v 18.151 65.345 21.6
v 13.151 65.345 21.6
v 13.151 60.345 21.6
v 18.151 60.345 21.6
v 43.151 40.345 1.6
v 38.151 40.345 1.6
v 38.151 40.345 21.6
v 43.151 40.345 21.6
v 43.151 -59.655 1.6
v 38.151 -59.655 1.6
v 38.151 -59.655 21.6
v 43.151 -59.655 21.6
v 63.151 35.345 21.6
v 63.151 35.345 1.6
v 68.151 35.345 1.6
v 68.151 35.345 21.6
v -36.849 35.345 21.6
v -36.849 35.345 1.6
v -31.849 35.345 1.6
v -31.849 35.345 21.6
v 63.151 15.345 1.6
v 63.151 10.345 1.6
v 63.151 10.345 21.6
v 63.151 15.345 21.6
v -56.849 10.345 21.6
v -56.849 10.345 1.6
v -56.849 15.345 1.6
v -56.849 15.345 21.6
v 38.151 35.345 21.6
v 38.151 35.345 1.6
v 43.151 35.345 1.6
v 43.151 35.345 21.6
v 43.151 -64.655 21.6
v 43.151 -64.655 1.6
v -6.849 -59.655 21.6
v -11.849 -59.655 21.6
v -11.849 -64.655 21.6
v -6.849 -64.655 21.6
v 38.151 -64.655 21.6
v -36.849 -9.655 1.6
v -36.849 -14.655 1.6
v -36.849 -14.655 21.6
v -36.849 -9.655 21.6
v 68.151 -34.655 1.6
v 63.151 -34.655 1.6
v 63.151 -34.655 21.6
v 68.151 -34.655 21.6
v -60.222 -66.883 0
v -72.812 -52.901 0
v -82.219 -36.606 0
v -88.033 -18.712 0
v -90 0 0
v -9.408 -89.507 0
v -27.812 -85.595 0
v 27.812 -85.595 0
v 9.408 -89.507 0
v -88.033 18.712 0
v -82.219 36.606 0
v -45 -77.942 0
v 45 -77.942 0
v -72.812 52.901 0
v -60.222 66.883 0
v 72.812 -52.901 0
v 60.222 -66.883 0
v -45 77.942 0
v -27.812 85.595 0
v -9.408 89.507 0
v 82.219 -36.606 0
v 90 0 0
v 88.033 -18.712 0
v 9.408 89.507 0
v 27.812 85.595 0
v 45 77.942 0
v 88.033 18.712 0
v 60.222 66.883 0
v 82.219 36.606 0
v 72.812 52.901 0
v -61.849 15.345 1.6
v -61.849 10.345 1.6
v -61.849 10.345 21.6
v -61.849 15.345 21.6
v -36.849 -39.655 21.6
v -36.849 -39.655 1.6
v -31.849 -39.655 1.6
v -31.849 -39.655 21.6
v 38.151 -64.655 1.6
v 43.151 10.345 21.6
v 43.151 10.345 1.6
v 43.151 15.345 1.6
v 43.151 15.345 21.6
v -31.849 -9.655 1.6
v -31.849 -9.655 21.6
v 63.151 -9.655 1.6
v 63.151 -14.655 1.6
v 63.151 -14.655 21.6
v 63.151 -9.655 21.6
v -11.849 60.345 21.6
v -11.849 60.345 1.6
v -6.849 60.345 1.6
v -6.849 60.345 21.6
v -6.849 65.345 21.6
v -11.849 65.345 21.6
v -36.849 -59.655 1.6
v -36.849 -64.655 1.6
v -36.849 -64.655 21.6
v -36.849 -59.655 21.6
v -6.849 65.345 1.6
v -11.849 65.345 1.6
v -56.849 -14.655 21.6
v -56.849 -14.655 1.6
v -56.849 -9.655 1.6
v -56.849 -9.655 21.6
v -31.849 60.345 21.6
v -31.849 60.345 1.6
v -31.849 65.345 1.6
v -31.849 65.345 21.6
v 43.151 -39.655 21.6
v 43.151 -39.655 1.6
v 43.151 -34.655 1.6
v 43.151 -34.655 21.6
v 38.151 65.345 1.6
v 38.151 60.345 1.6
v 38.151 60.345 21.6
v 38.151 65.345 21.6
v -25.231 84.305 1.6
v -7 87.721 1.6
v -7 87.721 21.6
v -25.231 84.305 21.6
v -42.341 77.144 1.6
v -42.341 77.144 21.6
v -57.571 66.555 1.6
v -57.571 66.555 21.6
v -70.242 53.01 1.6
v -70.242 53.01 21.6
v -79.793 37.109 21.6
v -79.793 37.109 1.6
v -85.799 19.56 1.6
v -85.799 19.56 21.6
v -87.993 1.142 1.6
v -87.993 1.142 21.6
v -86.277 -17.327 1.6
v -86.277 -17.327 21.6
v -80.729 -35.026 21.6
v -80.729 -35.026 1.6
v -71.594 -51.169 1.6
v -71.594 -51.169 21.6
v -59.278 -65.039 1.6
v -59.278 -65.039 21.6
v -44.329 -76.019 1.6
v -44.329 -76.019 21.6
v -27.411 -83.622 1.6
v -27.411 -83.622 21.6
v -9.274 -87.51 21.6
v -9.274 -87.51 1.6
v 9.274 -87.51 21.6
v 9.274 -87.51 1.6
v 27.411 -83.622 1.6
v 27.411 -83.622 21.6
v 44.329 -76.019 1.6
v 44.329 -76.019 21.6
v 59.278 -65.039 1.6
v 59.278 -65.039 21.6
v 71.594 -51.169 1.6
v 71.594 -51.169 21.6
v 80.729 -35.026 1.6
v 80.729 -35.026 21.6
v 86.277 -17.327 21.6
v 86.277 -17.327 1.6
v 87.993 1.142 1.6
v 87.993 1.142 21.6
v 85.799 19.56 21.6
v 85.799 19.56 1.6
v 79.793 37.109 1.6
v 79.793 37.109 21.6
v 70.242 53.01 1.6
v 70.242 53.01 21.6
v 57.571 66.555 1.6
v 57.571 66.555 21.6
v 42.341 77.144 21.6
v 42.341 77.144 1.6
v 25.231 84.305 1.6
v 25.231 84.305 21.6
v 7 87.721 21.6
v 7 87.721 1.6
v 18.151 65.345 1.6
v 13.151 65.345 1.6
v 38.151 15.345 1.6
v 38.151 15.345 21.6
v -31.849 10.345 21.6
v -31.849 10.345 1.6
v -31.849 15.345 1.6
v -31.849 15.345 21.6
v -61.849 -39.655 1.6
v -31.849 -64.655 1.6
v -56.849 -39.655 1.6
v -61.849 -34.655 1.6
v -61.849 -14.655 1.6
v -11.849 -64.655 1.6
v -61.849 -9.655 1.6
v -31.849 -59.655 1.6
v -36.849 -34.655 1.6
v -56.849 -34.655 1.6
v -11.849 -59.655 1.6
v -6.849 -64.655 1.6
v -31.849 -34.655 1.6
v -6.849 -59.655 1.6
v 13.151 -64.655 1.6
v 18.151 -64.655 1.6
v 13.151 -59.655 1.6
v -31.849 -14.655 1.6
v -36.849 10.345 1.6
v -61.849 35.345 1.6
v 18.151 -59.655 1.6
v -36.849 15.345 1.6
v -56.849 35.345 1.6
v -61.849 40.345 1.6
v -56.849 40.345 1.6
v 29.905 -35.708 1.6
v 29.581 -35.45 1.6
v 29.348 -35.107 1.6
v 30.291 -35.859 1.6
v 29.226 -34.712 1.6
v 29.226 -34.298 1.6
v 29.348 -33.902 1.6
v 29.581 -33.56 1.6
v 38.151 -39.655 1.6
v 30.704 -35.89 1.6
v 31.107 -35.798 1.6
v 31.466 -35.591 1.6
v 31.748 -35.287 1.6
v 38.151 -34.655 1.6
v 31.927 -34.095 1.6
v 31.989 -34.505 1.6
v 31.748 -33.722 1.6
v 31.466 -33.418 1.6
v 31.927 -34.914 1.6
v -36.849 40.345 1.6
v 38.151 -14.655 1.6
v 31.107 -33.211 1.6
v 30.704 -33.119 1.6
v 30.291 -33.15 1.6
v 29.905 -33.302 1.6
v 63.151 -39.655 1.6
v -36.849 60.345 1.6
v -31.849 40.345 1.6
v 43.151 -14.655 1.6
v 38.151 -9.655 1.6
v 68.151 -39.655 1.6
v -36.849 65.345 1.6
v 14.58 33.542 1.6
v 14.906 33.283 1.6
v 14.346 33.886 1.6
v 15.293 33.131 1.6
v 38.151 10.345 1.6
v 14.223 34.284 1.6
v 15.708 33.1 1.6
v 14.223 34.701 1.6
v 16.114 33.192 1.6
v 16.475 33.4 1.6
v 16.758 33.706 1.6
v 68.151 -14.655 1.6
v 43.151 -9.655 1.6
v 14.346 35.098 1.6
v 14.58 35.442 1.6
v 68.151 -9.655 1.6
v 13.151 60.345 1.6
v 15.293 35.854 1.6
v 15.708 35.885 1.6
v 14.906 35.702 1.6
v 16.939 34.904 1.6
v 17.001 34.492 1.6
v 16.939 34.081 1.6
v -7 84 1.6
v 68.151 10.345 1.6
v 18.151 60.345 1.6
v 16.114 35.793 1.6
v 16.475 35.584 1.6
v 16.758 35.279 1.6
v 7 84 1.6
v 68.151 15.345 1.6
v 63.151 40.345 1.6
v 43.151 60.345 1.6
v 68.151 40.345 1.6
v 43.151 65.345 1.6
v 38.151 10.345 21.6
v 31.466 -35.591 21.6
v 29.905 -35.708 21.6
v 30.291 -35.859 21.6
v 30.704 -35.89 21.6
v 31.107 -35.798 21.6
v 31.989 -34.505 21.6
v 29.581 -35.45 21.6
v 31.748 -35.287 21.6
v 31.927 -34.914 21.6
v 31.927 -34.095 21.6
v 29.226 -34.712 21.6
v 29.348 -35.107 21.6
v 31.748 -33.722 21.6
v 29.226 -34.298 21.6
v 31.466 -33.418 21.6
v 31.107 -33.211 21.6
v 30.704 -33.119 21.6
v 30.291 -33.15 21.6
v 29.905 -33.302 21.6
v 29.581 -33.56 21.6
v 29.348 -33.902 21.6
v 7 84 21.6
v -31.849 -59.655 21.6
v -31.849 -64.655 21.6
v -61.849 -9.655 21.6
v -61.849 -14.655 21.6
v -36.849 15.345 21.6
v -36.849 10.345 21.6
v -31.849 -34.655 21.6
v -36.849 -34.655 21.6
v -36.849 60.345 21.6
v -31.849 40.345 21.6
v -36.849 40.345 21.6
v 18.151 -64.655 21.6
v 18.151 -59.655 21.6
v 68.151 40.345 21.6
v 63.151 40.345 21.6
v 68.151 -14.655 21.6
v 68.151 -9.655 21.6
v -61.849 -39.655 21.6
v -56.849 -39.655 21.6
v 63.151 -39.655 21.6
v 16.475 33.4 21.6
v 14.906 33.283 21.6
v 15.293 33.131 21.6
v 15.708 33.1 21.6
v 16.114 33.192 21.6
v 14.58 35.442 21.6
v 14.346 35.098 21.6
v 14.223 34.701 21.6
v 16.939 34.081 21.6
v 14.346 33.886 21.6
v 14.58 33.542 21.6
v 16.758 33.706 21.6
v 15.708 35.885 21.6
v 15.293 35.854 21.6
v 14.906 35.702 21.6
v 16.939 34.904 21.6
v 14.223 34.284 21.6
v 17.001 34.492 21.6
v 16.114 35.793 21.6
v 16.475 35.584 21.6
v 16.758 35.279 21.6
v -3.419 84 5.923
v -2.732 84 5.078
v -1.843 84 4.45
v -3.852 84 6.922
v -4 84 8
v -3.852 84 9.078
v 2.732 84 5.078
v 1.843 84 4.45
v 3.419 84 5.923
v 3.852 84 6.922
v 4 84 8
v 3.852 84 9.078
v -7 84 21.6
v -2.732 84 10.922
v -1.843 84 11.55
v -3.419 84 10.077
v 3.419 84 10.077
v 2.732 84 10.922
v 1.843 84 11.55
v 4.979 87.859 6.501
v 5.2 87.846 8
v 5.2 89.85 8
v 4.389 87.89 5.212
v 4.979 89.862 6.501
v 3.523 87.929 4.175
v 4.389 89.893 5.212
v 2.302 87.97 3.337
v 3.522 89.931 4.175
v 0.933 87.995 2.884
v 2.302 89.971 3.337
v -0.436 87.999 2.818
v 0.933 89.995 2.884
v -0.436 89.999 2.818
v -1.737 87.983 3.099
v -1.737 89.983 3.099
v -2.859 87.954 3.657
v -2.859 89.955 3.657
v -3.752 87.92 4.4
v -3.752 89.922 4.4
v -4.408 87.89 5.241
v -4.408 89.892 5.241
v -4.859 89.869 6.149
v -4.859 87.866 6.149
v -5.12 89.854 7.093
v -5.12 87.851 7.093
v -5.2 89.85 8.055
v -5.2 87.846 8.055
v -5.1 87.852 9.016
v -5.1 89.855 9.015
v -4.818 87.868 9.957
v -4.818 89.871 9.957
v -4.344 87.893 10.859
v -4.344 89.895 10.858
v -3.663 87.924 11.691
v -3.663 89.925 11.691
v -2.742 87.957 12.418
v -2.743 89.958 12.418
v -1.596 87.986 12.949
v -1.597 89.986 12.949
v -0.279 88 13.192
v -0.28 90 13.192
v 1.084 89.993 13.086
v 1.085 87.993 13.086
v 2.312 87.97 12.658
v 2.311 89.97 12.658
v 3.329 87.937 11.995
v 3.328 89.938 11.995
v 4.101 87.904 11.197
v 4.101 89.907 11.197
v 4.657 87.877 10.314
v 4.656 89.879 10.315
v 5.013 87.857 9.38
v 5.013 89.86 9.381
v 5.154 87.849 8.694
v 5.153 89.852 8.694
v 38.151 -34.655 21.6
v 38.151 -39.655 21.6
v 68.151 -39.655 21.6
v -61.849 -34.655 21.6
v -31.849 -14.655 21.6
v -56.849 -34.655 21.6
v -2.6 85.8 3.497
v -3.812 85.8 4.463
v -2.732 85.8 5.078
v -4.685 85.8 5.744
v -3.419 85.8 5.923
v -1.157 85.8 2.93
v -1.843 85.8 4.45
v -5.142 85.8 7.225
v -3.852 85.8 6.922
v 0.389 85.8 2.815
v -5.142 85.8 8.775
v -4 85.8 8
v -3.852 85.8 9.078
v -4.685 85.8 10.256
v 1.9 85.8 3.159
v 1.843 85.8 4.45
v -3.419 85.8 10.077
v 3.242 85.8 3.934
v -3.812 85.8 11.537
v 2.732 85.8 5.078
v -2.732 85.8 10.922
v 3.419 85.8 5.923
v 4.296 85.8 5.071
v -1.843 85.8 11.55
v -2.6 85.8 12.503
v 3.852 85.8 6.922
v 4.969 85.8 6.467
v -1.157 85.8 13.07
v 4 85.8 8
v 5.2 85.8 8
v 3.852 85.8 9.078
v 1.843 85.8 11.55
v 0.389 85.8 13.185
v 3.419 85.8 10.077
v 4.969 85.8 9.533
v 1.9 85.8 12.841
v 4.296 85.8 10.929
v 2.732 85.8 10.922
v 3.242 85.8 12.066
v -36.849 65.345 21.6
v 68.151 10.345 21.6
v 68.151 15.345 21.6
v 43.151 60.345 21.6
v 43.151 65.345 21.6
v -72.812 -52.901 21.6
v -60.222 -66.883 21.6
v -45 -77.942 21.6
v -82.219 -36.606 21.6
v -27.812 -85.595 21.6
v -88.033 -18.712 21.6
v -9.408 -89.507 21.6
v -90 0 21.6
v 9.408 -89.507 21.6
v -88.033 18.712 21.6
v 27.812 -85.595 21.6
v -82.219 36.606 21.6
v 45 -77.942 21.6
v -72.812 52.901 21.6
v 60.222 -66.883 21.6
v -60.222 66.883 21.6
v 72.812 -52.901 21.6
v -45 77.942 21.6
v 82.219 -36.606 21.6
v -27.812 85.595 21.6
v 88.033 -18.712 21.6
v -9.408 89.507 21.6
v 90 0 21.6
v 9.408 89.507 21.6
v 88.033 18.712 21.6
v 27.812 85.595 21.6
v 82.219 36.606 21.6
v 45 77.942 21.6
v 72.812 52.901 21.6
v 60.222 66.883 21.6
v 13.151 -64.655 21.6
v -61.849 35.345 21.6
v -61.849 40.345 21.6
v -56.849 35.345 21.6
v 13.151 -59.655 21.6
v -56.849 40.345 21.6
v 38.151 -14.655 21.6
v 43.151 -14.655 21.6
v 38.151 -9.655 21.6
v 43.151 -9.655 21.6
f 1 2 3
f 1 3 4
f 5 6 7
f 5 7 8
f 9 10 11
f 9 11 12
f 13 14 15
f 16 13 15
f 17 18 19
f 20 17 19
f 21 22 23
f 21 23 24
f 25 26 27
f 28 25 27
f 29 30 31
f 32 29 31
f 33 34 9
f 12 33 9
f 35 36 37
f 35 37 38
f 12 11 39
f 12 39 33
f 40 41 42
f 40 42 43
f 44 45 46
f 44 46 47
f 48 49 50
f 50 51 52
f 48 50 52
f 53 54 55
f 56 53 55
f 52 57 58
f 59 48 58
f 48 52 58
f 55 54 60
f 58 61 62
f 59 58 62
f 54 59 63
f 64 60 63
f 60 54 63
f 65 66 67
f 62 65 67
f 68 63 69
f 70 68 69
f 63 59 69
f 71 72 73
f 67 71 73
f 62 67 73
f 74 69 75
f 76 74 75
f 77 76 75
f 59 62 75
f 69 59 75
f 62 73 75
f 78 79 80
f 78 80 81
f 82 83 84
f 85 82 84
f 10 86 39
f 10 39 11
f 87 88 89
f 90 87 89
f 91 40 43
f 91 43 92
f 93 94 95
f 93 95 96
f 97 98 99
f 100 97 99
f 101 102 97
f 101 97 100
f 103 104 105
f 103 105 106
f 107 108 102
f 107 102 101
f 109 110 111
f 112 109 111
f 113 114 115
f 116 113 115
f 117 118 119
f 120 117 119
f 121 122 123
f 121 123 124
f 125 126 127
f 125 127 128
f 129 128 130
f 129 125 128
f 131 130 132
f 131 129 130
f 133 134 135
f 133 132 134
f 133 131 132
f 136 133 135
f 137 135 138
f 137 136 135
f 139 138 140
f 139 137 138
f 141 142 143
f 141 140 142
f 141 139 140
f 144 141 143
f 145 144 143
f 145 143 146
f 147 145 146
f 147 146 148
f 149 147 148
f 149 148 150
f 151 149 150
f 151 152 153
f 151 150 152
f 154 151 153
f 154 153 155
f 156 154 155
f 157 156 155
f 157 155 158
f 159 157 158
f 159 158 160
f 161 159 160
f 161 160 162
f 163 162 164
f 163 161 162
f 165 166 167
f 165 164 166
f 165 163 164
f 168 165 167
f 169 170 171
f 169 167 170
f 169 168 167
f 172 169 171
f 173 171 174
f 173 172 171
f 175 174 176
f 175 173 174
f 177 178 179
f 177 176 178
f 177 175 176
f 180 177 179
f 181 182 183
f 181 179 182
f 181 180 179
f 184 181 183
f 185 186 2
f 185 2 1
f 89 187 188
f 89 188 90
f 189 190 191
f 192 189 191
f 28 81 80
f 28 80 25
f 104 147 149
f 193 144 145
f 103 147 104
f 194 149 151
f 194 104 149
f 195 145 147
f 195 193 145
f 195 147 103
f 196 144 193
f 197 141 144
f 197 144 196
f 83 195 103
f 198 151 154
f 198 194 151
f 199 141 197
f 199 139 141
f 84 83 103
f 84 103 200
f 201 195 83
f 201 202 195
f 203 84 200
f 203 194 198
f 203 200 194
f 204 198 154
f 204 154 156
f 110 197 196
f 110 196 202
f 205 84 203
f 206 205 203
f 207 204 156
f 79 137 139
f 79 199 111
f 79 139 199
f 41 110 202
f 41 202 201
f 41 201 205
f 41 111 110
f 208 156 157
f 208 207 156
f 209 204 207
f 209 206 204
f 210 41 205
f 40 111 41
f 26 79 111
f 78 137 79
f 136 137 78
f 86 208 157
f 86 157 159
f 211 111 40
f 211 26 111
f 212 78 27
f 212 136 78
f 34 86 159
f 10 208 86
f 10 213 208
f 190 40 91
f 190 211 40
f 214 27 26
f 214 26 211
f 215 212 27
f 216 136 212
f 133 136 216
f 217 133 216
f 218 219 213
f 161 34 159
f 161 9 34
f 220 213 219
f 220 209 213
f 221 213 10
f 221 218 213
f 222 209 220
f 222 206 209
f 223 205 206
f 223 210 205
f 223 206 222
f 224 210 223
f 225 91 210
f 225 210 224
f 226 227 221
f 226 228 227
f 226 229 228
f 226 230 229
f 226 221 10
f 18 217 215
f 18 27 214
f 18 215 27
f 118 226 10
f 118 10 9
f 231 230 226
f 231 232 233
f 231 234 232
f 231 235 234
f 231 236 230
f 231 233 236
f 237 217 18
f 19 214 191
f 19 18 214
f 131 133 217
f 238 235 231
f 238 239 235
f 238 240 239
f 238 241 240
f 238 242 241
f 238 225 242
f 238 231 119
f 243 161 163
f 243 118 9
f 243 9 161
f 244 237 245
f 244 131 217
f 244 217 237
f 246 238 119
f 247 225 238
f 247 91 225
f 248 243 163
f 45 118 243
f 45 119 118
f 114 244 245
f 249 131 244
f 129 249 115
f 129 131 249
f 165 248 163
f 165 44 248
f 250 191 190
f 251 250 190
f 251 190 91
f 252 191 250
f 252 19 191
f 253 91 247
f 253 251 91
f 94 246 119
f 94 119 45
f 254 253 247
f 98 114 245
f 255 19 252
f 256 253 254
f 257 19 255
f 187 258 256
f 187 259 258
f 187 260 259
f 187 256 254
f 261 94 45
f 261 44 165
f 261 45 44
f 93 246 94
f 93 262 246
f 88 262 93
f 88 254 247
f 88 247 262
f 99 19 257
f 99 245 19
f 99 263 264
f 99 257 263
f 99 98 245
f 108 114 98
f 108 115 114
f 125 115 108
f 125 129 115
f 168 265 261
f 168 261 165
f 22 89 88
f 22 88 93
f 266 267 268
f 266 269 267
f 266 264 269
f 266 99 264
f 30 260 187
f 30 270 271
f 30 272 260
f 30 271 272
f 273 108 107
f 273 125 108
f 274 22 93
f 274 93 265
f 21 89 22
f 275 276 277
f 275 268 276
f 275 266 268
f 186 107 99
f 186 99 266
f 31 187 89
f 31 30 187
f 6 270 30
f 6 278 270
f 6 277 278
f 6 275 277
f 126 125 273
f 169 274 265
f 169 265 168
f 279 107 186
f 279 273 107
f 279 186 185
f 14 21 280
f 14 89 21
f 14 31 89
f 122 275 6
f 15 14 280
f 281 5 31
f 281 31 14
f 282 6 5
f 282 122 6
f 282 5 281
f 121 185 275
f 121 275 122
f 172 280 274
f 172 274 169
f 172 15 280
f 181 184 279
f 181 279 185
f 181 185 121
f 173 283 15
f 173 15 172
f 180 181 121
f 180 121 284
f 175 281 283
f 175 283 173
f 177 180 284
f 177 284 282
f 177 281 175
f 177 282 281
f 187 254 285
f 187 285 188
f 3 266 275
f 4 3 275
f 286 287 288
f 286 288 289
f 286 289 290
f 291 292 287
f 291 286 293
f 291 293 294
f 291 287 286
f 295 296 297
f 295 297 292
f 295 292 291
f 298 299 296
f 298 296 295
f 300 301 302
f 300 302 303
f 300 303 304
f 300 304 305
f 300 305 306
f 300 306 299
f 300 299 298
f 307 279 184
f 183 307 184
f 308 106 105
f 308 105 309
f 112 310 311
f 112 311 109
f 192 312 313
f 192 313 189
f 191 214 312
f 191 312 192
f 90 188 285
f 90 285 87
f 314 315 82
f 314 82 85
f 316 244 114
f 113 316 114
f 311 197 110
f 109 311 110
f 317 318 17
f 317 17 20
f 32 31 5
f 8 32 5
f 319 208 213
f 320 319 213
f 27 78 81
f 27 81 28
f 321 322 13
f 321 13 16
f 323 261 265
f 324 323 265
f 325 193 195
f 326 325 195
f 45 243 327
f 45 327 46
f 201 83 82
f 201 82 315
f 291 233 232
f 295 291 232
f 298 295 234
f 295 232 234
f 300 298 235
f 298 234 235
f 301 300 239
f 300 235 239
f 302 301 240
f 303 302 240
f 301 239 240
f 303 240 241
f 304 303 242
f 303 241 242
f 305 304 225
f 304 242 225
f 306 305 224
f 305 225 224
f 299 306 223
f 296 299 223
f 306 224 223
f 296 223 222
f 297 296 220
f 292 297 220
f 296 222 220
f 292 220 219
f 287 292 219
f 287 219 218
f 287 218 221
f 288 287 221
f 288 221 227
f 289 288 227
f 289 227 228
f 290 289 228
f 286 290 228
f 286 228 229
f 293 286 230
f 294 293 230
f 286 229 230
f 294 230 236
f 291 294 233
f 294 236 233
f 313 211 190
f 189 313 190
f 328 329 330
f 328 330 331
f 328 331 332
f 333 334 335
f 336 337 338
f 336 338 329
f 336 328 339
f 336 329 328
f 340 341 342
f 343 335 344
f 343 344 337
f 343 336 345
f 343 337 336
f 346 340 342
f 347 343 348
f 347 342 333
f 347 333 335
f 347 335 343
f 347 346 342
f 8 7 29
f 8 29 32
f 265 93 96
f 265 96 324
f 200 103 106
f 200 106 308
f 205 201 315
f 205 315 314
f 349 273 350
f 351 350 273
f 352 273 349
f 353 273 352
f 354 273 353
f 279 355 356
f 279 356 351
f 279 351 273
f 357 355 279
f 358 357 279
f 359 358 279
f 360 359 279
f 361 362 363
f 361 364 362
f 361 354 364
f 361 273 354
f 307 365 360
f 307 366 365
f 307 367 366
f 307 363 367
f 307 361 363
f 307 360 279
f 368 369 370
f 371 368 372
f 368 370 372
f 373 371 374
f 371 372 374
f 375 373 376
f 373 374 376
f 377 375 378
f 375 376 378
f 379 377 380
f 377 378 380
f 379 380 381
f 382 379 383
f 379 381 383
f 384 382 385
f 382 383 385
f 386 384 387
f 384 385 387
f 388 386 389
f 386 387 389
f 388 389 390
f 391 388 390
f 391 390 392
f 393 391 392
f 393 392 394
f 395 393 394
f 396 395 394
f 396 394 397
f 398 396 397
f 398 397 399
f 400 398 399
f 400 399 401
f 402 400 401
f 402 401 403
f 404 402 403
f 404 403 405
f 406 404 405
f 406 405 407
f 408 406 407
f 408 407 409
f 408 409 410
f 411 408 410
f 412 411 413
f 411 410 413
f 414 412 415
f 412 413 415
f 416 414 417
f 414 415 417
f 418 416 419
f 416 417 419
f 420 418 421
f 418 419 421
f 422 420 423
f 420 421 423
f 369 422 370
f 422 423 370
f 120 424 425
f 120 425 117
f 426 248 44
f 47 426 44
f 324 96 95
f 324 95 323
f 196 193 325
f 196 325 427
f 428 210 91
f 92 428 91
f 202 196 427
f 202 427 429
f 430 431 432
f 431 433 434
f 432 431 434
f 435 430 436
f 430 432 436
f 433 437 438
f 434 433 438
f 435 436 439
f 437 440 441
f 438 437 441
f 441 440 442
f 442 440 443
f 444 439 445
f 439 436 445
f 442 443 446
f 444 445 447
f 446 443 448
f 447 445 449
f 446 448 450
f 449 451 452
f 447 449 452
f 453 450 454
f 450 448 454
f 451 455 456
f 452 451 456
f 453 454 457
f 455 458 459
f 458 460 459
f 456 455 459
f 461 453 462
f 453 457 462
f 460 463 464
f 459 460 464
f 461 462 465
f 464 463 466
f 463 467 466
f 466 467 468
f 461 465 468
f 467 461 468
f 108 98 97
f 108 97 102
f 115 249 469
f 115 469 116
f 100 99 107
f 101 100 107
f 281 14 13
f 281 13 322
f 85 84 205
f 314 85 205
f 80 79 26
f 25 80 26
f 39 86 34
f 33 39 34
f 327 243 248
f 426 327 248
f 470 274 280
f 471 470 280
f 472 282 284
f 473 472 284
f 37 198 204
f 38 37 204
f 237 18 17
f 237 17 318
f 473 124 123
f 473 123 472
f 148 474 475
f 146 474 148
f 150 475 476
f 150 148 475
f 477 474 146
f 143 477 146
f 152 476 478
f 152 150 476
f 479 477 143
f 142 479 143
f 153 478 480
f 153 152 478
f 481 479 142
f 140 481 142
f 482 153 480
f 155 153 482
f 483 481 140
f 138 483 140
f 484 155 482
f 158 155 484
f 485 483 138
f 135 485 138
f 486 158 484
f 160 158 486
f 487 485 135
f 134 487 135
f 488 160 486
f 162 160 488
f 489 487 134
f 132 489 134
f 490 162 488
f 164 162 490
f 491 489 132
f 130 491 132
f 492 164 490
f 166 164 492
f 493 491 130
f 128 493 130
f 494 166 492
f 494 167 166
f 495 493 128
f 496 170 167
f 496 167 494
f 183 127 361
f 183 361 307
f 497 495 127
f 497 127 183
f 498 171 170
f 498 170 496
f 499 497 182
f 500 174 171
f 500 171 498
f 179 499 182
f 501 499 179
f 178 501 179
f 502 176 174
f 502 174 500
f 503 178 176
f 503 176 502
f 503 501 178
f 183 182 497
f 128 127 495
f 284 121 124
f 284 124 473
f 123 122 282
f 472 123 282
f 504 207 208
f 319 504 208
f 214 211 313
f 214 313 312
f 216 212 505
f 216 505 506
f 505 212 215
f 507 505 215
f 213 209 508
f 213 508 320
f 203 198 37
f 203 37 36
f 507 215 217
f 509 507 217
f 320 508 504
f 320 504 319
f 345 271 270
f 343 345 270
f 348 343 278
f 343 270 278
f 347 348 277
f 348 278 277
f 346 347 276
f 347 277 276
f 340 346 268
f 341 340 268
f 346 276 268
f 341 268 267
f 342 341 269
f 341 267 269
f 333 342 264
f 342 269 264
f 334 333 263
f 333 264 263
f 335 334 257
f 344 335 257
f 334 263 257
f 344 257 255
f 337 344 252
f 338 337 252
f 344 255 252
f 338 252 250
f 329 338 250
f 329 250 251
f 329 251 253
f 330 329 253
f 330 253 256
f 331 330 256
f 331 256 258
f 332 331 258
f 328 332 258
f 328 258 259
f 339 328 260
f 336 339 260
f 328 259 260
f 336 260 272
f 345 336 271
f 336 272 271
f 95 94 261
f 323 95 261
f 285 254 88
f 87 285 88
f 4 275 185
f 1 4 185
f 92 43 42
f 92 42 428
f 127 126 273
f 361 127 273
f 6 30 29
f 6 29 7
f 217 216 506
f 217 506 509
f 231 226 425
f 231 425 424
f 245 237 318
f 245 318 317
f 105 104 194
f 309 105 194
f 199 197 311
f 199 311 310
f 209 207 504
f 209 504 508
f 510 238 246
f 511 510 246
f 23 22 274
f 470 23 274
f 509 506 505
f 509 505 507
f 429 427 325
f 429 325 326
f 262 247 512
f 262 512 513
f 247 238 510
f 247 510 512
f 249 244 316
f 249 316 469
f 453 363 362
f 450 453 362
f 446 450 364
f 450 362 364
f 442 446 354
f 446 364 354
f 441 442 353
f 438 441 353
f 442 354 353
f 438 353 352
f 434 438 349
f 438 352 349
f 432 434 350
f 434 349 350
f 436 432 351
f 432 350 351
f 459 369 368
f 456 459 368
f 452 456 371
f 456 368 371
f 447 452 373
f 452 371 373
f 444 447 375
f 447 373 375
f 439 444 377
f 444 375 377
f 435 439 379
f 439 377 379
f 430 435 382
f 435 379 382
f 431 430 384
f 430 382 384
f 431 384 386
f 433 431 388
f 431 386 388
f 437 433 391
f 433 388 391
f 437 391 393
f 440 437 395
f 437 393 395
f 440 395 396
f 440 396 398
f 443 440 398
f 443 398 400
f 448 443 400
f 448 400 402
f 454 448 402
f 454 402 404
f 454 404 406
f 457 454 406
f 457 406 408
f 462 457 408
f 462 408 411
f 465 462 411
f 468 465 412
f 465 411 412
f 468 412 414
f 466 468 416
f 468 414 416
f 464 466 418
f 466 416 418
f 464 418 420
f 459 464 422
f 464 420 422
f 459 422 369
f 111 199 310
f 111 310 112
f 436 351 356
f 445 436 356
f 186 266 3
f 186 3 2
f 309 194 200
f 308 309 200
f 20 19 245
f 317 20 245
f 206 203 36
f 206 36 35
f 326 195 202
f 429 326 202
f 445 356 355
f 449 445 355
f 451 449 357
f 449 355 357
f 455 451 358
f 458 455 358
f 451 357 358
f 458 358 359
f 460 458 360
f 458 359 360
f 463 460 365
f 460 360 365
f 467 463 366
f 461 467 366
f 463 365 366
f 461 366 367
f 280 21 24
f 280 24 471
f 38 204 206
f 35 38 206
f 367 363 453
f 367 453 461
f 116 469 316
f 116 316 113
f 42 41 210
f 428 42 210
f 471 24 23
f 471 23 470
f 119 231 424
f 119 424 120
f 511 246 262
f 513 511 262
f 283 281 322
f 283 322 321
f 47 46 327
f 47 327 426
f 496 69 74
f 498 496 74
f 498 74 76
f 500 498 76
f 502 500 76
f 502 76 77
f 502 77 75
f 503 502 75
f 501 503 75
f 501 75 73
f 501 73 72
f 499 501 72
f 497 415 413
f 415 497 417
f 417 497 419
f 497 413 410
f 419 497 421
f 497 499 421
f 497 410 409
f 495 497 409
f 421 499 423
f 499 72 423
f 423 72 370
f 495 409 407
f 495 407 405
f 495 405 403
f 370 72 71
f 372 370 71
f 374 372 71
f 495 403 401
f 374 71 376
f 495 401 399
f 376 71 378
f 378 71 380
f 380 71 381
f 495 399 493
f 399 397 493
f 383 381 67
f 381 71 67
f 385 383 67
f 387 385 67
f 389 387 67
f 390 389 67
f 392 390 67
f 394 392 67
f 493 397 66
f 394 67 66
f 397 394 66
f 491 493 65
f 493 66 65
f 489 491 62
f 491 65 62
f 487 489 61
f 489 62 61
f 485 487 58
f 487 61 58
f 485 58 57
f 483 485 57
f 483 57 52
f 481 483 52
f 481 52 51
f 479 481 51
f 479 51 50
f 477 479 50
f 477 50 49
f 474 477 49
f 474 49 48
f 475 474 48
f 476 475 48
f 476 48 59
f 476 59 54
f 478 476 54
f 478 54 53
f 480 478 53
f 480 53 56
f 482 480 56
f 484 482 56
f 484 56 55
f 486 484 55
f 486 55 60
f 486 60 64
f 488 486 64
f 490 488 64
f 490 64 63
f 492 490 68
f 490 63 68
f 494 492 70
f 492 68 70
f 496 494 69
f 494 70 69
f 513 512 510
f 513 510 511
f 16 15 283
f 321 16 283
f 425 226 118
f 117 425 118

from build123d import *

# Parameters (mm, degrees)
SKETCH_R        = 90
PAD_DEPTH       = 1.6
SKETCH001_R     = 90
SKETCH001_R_2   = 88
PAD001_DEPTH    = 20
SKETCH006_R     = 5.2
POCKET_DEPTH    = 6
PAD006_DEPTH    = 20
POCKET001_DEPTH = 8
SKETCH008_R     = 5.2
PAD007_DEPTH    = 1.8
SKETCH057_R     = 1.396673
SKETCH057_R_2   = 1.389292
SKETCH057_W     = 5
SKETCH057_H     = 5
PAD037_DEPTH    = 20


with BuildPart() as part:
    # Sketch → Pad (new body)
    with BuildSketch(Plane.XY):
        Circle(SKETCH_R)
    extrude(amount=PAD_DEPTH)

    # Sketch001 (on Face3 of Pad) → Pad001 (join)
    with BuildSketch(Plane.XY.offset(1.6)):
        Circle(SKETCH001_R)
        Circle(SKETCH001_R_2, mode=Mode.SUBTRACT)
    extrude(amount=PAD001_DEPTH)

    # Sketch006 (on Face2 of ShapeBinder) → Pocket (cut)
    with BuildSketch(Plane(origin=(0, 90, 8), x_dir=(1, 0, 0), z_dir=(0, 1, 0))):
        Circle(SKETCH006_R)
    extrude(amount=-POCKET_DEPTH, mode=Mode.SUBTRACT)

    # Sketch007 (on Face7 of Pocket) → Pad006 (join)
    with BuildSketch(Plane.XY.offset(1.6)):
        with BuildLine():
            ThreePointArc((7, 87.721149), (0, 88), (-7, 87.721149))
            Line((-7, 87.721149), (-7, 84))
            Line((-7, 84), (7, 84))
            Line((7, 84), (7, 87.721149))
        make_face()
    extrude(amount=PAD006_DEPTH)

    # Sketch006 (on Face2 of ShapeBinder) → Pocket001 (cut)
    with BuildSketch(Plane(origin=(0, 90, 8), x_dir=(1, 0, 0), z_dir=(0, 1, 0))):
        Circle(SKETCH006_R)
    extrude(amount=-POCKET001_DEPTH, mode=Mode.SUBTRACT)

    # Sketch008 (on Face13 of Pocket001) → Pad007 (join)
    with BuildSketch(Plane.XZ.offset(-84)):
        with Locations((0, 8)):
            Circle(SKETCH008_R)
        with BuildLine():
            ThreePointArc((1.843231, 4.45), (4, 8), (1.843231, 11.55))
            Line((-1.843231, 11.55), (1.843231, 11.55))
            ThreePointArc((-1.843231, 11.55), (-4, 8), (-1.843231, 4.45))
            Line((-1.843231, 4.45), (1.843231, 4.45))
        make_face(mode=Mode.SUBTRACT)
    extrude(amount=-PAD007_DEPTH)

    # Sketch057 (on Face10 of Pad007) → Pad037 (join)
    with BuildSketch(Plane.XY.offset(1.6)):
        with Locations((15.604022, 34.492405)):
            Circle(SKETCH057_R)
        with Locations((30.599703, -34.504681)):
            Circle(SKETCH057_R_2)
        with Locations((-34.349093, -62.155302)):
            Rectangle(SKETCH057_W, SKETCH057_H)
        with Locations((-9.349093, -62.155302)):
            Rectangle(SKETCH057_W, SKETCH057_H)
        with Locations((15.650907, -62.155302)):
            Rectangle(SKETCH057_W, SKETCH057_H)
        with Locations((40.650907, -62.155302)):
            Rectangle(SKETCH057_W, SKETCH057_H)
        with Locations((-59.349093, -37.155302)):
            Rectangle(SKETCH057_W, SKETCH057_H)
        with Locations((-34.349093, -37.155302)):
            Rectangle(SKETCH057_W, SKETCH057_H)
        with Locations((40.650907, -37.155302)):
            Rectangle(SKETCH057_W, SKETCH057_H)
        with Locations((65.650907, -37.155302)):
            Rectangle(SKETCH057_W, SKETCH057_H)
        with Locations((-59.349093, -12.155302)):
            Rectangle(SKETCH057_W, SKETCH057_H)
        with Locations((-34.349093, -12.155302)):
            Rectangle(SKETCH057_W, SKETCH057_H)
        with Locations((40.650907, -12.155302)):
            Rectangle(SKETCH057_W, SKETCH057_H)
        with Locations((65.650907, -12.155302)):
            Rectangle(SKETCH057_W, SKETCH057_H)
        with Locations((-59.349093, 12.844698)):
            Rectangle(SKETCH057_W, SKETCH057_H)
        with Locations((-34.349093, 12.844698)):
            Rectangle(SKETCH057_W, SKETCH057_H)
        with Locations((40.650907, 12.844698)):
            Rectangle(SKETCH057_W, SKETCH057_H)
        with Locations((65.650907, 12.844698)):
            Rectangle(SKETCH057_W, SKETCH057_H)
        with Locations((-59.349093, 37.844698)):
            Rectangle(SKETCH057_W, SKETCH057_H)
        with Locations((-34.349093, 37.844698)):
            Rectangle(SKETCH057_W, SKETCH057_H)
        with Locations((40.650907, 37.844698)):
            Rectangle(SKETCH057_W, SKETCH057_H)
        with Locations((65.650907, 37.844698)):
            Rectangle(SKETCH057_W, SKETCH057_H)
        with Locations((-34.349093, 62.844698)):
            Rectangle(SKETCH057_W, SKETCH057_H)
        with Locations((-9.349093, 62.844698)):
            Rectangle(SKETCH057_W, SKETCH057_H)
        with Locations((15.650907, 62.844698)):
            Rectangle(SKETCH057_W, SKETCH057_H)
        with Locations((40.650907, 62.844698)):
            Rectangle(SKETCH057_W, SKETCH057_H)
    extrude(amount=PAD037_DEPTH)


solid = part.part
